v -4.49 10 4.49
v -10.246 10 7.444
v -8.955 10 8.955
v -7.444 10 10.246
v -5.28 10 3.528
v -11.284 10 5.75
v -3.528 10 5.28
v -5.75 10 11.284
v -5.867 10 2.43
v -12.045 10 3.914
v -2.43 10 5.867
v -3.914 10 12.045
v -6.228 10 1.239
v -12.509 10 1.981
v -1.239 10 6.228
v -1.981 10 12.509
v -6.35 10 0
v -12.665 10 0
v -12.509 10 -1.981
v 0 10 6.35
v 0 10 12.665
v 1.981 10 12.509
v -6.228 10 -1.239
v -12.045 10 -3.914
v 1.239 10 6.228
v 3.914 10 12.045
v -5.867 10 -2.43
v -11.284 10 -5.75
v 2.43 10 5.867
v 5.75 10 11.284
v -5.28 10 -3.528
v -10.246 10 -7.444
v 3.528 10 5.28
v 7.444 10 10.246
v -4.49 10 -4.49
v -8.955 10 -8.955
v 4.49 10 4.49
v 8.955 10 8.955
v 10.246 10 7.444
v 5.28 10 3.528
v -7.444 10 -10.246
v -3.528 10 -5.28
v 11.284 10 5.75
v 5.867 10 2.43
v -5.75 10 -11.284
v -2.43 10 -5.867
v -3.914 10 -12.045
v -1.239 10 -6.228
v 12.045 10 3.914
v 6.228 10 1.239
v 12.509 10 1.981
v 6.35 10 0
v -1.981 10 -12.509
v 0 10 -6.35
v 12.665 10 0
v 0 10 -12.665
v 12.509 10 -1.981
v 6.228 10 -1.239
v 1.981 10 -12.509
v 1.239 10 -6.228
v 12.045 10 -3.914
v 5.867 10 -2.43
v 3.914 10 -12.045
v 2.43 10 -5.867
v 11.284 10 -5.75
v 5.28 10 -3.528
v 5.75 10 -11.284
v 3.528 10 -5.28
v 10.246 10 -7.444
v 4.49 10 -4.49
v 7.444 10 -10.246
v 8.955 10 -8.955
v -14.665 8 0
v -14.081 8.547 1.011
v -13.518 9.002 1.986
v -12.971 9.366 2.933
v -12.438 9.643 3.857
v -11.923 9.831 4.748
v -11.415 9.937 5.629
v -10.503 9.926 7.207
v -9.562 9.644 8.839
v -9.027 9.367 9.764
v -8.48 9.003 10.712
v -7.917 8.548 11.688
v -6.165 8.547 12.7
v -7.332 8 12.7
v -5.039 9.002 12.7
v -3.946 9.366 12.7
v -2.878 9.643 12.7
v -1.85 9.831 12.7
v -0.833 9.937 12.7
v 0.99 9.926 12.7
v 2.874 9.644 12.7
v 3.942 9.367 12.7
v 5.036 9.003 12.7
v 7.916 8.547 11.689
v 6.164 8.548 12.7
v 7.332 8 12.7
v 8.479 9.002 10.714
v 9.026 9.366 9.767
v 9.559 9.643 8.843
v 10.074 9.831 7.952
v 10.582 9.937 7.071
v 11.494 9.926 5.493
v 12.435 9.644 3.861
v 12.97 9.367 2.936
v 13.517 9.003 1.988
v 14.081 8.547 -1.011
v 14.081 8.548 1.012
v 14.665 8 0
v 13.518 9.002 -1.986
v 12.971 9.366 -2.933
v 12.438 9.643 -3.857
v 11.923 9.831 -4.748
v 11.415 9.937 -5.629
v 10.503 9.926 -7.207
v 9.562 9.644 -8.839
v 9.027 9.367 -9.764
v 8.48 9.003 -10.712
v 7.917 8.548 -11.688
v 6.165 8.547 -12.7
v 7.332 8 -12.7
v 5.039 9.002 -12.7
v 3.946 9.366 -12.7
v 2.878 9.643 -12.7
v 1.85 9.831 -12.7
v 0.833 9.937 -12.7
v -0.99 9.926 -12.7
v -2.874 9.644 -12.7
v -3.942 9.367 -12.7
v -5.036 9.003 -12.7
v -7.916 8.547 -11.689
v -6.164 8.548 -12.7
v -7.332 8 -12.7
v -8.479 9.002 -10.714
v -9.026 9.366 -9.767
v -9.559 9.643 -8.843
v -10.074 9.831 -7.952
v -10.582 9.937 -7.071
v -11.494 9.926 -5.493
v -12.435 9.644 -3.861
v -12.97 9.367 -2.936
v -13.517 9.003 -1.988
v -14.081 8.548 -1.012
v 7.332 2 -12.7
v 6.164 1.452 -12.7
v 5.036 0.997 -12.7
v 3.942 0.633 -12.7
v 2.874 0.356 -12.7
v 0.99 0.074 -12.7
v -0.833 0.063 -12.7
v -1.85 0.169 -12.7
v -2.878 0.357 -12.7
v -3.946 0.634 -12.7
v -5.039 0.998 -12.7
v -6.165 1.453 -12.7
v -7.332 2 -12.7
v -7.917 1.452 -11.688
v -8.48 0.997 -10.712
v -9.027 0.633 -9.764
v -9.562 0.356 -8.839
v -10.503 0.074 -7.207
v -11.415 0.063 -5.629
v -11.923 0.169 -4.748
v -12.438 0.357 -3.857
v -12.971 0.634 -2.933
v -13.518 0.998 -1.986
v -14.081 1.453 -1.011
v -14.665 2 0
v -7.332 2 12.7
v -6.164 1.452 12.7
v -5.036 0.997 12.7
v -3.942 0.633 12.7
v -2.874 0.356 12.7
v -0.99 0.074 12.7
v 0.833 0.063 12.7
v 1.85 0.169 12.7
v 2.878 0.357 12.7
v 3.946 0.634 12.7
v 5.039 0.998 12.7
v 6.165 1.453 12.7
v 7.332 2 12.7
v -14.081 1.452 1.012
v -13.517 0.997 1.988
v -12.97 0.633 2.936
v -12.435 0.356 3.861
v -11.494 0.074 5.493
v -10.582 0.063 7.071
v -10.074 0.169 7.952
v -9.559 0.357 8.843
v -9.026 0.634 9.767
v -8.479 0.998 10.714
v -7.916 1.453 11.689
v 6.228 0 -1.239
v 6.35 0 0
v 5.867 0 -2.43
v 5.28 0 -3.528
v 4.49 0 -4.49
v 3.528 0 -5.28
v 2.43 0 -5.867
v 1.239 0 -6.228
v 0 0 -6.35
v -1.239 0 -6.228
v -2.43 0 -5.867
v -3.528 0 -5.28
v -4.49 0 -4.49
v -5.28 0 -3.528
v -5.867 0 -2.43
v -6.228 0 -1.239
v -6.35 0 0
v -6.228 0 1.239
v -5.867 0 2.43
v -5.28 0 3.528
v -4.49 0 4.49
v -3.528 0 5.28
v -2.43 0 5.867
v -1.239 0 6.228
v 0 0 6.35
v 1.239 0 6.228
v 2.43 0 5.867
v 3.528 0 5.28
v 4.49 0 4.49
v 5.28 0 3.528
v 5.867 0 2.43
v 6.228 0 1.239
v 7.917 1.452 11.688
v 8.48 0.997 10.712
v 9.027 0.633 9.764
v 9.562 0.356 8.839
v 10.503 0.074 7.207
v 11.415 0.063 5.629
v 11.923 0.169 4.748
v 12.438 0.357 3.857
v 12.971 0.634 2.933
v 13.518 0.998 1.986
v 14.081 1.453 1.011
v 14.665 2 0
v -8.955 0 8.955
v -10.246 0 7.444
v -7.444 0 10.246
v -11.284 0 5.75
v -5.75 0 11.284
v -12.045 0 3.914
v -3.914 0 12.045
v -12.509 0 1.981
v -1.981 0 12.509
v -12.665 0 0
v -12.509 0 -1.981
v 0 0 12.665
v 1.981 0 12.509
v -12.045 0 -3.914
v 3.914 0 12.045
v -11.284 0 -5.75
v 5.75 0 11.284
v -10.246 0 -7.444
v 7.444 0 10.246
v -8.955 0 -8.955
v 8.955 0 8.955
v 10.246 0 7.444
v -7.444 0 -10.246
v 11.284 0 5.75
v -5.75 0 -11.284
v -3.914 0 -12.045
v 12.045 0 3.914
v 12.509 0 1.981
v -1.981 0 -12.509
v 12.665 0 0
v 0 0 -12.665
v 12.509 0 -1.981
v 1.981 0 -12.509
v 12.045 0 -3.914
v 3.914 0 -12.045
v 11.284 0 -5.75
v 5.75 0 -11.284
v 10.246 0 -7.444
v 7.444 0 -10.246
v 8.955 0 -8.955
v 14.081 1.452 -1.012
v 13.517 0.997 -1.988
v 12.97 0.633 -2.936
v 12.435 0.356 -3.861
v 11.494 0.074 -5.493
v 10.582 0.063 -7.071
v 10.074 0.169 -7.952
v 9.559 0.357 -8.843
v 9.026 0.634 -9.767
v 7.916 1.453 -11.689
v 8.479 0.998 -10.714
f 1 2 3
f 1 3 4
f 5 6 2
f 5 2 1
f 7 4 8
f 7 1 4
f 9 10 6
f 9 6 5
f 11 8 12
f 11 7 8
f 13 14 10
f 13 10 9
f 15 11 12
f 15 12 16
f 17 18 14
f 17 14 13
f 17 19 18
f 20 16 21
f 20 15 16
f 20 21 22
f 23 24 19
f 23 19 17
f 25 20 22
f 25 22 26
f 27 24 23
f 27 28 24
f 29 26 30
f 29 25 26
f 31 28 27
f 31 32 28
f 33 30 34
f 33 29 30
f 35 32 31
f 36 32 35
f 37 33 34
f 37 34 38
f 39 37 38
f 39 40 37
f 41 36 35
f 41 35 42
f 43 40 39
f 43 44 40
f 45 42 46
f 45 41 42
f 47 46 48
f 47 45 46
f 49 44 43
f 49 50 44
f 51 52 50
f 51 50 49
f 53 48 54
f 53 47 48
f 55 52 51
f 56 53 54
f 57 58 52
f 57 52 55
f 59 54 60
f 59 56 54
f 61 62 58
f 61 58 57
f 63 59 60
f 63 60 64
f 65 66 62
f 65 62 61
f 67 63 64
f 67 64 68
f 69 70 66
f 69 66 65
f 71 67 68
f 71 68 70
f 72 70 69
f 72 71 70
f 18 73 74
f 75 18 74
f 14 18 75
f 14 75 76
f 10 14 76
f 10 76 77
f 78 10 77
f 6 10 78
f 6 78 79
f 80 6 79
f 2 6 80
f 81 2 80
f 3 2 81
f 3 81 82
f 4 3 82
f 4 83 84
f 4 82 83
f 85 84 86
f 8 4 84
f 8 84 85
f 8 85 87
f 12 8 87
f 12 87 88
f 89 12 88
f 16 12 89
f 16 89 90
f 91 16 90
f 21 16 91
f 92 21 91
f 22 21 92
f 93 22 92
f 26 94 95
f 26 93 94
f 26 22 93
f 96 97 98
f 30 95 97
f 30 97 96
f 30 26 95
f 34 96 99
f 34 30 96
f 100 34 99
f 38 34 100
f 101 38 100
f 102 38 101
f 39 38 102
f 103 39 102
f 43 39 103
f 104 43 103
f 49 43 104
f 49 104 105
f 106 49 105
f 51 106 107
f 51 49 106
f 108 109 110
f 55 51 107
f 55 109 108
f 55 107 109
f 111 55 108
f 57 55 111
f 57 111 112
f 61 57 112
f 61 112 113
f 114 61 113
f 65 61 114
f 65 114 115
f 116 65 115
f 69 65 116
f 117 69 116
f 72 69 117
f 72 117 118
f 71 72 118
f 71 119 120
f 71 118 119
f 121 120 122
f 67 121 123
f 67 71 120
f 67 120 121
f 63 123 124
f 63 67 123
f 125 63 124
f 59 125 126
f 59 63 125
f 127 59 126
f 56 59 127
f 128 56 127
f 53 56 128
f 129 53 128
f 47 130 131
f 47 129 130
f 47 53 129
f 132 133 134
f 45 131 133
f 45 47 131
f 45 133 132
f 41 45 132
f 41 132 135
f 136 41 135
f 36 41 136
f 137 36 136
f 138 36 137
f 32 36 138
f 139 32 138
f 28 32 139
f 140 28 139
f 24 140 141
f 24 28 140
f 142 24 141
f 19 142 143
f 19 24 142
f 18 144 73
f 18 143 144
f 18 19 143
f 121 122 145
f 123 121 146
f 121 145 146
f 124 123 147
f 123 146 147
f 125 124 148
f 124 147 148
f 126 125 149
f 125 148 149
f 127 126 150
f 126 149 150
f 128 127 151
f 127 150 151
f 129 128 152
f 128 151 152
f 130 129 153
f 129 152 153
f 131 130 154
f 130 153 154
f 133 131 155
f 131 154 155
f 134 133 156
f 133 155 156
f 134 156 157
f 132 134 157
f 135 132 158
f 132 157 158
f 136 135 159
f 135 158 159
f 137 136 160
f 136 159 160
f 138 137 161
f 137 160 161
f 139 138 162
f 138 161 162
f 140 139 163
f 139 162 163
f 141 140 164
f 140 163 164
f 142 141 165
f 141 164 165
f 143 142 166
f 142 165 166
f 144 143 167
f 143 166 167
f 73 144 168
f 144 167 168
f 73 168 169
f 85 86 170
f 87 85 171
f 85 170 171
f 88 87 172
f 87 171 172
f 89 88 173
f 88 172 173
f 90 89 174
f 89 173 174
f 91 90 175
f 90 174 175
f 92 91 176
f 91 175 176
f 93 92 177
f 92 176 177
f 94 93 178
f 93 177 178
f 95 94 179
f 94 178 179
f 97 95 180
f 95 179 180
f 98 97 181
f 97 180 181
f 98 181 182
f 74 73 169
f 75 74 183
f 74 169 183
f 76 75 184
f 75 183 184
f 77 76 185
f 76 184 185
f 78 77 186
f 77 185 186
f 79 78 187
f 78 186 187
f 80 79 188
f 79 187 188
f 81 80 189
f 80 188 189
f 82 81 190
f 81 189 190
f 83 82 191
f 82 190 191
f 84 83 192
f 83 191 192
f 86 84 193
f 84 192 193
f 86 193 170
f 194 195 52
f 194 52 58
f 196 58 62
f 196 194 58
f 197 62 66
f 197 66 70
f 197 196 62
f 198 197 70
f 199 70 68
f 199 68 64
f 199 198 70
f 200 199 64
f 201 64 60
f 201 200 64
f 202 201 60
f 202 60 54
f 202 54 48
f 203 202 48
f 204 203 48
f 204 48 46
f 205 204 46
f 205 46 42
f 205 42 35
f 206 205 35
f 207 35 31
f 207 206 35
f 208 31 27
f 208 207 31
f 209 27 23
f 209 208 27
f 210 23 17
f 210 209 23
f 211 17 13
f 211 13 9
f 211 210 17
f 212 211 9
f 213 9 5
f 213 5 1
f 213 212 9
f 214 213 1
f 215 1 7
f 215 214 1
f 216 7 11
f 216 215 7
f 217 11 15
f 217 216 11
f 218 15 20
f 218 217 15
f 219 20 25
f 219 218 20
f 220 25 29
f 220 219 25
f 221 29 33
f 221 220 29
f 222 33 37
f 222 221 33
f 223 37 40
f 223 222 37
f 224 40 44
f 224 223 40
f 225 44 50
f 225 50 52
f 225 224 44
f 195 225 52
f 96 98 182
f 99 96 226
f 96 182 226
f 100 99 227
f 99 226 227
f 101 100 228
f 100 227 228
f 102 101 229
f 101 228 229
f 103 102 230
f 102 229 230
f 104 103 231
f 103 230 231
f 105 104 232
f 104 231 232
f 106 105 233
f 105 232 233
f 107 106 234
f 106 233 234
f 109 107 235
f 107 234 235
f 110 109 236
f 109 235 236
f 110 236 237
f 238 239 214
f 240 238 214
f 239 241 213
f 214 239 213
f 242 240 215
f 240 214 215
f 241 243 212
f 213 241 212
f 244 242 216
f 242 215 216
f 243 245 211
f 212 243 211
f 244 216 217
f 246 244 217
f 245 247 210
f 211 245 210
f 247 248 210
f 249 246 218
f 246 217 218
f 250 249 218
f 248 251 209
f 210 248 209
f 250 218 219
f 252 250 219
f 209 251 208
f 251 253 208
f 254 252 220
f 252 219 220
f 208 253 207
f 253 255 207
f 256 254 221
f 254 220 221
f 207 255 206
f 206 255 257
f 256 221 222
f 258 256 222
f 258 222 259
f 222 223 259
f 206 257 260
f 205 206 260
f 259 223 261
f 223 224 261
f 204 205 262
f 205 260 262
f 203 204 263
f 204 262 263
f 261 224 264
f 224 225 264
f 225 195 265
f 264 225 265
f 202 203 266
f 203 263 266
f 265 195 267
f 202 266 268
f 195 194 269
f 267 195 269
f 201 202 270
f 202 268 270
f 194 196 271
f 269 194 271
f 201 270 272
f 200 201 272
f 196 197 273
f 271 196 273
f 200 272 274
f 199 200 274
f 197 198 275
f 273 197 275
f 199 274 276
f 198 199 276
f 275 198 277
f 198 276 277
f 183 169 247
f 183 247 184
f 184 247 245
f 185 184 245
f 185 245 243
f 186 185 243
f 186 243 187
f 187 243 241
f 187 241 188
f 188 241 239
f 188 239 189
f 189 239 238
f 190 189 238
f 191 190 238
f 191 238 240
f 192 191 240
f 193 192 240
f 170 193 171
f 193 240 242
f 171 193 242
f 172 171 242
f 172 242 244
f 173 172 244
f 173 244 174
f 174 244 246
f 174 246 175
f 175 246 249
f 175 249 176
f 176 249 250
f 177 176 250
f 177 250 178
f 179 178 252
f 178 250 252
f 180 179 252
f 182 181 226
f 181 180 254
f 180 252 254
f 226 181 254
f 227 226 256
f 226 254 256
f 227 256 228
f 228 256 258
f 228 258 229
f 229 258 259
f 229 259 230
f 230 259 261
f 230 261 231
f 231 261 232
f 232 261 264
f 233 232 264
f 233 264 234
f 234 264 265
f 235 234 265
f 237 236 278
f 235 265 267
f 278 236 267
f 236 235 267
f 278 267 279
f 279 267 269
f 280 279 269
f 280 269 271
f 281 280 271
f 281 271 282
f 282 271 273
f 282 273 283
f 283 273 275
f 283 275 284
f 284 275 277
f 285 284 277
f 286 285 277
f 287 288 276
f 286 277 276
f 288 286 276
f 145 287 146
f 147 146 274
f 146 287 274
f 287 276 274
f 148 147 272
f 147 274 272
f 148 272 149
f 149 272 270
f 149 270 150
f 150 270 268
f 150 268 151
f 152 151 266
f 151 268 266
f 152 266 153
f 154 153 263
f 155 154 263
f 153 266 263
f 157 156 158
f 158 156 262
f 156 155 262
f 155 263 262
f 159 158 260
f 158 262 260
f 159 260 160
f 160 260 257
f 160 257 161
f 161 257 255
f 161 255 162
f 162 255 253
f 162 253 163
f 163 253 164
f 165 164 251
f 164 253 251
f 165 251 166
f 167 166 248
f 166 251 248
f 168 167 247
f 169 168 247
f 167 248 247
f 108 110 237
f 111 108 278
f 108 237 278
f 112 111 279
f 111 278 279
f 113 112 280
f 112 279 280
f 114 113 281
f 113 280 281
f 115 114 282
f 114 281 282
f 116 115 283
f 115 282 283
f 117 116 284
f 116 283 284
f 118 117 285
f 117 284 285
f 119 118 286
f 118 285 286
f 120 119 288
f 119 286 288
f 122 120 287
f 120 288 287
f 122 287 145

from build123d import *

# Parameters (mm, degrees)
CROQUIS1_R              = 6.35
SALIENTE_EXTRUIR1_DEPTH = 10


with BuildPart() as part:
    # Croquis1 → Saliente-Extruir1 (new body)
    with BuildSketch(Plane(origin=(0, 0, 0), x_dir=(1, 0, 0), z_dir=(0, 1, 0))):
        Polygon((-7.332348419, -12.7), (7.332348419, -12.7), (14.664696837, 0), (7.332348419, 12.7), (-7.332348419, 12.7), (-14.664696837, 0), align=None)
        Circle(CROQUIS1_R, mode=Mode.SUBTRACT)
    extrude(amount=SALIENTE_EXTRUIR1_DEPTH)

    # Croquis2 → Cortar-Revolución1 (revolve, cut)
    with BuildSketch(Plane.XY):
        Polygon((-14.664696837, 8), (-12.664696837, 10), (-14.664696837, 10), align=None)
    cortar_revoluci_n1 = revolve(axis=Axis((0, 0, 0), (0, 1, 0)), mode=Mode.SUBTRACT)

    # Simetría1: Cortar-Revolución1 across plane
    add(cortar_revoluci_n1.mirror(Plane.ZX.offset(5)), mode=Mode.SUBTRACT)


solid = part.part
